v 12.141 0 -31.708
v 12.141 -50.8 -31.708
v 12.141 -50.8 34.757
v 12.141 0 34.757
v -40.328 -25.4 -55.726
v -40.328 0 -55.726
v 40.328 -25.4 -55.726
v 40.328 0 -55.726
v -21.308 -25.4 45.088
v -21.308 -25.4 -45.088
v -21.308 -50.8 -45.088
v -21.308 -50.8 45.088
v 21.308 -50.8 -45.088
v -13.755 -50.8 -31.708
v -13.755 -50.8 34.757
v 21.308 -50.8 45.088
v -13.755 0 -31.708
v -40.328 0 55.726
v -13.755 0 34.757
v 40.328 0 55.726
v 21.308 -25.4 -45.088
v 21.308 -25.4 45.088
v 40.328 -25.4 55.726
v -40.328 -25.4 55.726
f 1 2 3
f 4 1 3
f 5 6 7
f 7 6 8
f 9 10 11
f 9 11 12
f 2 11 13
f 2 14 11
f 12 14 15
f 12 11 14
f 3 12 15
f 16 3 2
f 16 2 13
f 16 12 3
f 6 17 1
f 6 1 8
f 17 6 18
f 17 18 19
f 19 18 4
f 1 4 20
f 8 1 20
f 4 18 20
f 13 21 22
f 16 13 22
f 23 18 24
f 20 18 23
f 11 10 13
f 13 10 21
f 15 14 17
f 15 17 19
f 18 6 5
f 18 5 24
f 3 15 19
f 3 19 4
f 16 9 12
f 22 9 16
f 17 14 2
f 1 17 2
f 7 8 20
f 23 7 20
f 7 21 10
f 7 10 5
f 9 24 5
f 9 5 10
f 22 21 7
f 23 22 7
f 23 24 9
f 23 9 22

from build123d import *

# Parameters (mm, degrees)
F0_W     = 80.655814
F0_H     = 111.451716
F1_DEPTH = 25.4
F2_W     = 47.660246
F2_H     = 87.988168
F3_DEPTH = 25.4
F4_W     = 42.61583
F4_H     = 90.175256
F4_W_2   = 25.895656
F4_H_2   = 66.464574
F5_DEPTH = 25.4
F6_W     = 25.895656
F6_H     = 66.464574
F7_DEPTH = 31.594573


with BuildPart() as f1:
    # F0 (on Front) → F1 (new body)
    with BuildSketch(Plane.XZ):
        Rectangle(F0_W, F0_H)
    extrude(amount=F1_DEPTH)

    # F2 (on Front) → F3 (join)
    with BuildSketch(Plane.XZ):
        Rectangle(F2_W, F2_H)
    extrude(amount=F3_DEPTH)

    # F4 (on face) → F5 (join)
    with BuildSketch(Plane.XZ.offset(25.4)):
        Rectangle(F4_W, F4_H)
        with Locations((-0.807181, 1.524575)):
            Rectangle(F4_W_2, F4_H_2, mode=Mode.SUBTRACT)
    extrude(amount=F5_DEPTH)

    # F6 (on face) → F7 (cut)
    with BuildSketch(Plane.XZ.offset(25.4)):
        with Locations((-0.807181, 1.524575)):
            Rectangle(F6_W, F6_H)
    extrude(amount=-F7_DEPTH, mode=Mode.SUBTRACT)


solid = f1.part
